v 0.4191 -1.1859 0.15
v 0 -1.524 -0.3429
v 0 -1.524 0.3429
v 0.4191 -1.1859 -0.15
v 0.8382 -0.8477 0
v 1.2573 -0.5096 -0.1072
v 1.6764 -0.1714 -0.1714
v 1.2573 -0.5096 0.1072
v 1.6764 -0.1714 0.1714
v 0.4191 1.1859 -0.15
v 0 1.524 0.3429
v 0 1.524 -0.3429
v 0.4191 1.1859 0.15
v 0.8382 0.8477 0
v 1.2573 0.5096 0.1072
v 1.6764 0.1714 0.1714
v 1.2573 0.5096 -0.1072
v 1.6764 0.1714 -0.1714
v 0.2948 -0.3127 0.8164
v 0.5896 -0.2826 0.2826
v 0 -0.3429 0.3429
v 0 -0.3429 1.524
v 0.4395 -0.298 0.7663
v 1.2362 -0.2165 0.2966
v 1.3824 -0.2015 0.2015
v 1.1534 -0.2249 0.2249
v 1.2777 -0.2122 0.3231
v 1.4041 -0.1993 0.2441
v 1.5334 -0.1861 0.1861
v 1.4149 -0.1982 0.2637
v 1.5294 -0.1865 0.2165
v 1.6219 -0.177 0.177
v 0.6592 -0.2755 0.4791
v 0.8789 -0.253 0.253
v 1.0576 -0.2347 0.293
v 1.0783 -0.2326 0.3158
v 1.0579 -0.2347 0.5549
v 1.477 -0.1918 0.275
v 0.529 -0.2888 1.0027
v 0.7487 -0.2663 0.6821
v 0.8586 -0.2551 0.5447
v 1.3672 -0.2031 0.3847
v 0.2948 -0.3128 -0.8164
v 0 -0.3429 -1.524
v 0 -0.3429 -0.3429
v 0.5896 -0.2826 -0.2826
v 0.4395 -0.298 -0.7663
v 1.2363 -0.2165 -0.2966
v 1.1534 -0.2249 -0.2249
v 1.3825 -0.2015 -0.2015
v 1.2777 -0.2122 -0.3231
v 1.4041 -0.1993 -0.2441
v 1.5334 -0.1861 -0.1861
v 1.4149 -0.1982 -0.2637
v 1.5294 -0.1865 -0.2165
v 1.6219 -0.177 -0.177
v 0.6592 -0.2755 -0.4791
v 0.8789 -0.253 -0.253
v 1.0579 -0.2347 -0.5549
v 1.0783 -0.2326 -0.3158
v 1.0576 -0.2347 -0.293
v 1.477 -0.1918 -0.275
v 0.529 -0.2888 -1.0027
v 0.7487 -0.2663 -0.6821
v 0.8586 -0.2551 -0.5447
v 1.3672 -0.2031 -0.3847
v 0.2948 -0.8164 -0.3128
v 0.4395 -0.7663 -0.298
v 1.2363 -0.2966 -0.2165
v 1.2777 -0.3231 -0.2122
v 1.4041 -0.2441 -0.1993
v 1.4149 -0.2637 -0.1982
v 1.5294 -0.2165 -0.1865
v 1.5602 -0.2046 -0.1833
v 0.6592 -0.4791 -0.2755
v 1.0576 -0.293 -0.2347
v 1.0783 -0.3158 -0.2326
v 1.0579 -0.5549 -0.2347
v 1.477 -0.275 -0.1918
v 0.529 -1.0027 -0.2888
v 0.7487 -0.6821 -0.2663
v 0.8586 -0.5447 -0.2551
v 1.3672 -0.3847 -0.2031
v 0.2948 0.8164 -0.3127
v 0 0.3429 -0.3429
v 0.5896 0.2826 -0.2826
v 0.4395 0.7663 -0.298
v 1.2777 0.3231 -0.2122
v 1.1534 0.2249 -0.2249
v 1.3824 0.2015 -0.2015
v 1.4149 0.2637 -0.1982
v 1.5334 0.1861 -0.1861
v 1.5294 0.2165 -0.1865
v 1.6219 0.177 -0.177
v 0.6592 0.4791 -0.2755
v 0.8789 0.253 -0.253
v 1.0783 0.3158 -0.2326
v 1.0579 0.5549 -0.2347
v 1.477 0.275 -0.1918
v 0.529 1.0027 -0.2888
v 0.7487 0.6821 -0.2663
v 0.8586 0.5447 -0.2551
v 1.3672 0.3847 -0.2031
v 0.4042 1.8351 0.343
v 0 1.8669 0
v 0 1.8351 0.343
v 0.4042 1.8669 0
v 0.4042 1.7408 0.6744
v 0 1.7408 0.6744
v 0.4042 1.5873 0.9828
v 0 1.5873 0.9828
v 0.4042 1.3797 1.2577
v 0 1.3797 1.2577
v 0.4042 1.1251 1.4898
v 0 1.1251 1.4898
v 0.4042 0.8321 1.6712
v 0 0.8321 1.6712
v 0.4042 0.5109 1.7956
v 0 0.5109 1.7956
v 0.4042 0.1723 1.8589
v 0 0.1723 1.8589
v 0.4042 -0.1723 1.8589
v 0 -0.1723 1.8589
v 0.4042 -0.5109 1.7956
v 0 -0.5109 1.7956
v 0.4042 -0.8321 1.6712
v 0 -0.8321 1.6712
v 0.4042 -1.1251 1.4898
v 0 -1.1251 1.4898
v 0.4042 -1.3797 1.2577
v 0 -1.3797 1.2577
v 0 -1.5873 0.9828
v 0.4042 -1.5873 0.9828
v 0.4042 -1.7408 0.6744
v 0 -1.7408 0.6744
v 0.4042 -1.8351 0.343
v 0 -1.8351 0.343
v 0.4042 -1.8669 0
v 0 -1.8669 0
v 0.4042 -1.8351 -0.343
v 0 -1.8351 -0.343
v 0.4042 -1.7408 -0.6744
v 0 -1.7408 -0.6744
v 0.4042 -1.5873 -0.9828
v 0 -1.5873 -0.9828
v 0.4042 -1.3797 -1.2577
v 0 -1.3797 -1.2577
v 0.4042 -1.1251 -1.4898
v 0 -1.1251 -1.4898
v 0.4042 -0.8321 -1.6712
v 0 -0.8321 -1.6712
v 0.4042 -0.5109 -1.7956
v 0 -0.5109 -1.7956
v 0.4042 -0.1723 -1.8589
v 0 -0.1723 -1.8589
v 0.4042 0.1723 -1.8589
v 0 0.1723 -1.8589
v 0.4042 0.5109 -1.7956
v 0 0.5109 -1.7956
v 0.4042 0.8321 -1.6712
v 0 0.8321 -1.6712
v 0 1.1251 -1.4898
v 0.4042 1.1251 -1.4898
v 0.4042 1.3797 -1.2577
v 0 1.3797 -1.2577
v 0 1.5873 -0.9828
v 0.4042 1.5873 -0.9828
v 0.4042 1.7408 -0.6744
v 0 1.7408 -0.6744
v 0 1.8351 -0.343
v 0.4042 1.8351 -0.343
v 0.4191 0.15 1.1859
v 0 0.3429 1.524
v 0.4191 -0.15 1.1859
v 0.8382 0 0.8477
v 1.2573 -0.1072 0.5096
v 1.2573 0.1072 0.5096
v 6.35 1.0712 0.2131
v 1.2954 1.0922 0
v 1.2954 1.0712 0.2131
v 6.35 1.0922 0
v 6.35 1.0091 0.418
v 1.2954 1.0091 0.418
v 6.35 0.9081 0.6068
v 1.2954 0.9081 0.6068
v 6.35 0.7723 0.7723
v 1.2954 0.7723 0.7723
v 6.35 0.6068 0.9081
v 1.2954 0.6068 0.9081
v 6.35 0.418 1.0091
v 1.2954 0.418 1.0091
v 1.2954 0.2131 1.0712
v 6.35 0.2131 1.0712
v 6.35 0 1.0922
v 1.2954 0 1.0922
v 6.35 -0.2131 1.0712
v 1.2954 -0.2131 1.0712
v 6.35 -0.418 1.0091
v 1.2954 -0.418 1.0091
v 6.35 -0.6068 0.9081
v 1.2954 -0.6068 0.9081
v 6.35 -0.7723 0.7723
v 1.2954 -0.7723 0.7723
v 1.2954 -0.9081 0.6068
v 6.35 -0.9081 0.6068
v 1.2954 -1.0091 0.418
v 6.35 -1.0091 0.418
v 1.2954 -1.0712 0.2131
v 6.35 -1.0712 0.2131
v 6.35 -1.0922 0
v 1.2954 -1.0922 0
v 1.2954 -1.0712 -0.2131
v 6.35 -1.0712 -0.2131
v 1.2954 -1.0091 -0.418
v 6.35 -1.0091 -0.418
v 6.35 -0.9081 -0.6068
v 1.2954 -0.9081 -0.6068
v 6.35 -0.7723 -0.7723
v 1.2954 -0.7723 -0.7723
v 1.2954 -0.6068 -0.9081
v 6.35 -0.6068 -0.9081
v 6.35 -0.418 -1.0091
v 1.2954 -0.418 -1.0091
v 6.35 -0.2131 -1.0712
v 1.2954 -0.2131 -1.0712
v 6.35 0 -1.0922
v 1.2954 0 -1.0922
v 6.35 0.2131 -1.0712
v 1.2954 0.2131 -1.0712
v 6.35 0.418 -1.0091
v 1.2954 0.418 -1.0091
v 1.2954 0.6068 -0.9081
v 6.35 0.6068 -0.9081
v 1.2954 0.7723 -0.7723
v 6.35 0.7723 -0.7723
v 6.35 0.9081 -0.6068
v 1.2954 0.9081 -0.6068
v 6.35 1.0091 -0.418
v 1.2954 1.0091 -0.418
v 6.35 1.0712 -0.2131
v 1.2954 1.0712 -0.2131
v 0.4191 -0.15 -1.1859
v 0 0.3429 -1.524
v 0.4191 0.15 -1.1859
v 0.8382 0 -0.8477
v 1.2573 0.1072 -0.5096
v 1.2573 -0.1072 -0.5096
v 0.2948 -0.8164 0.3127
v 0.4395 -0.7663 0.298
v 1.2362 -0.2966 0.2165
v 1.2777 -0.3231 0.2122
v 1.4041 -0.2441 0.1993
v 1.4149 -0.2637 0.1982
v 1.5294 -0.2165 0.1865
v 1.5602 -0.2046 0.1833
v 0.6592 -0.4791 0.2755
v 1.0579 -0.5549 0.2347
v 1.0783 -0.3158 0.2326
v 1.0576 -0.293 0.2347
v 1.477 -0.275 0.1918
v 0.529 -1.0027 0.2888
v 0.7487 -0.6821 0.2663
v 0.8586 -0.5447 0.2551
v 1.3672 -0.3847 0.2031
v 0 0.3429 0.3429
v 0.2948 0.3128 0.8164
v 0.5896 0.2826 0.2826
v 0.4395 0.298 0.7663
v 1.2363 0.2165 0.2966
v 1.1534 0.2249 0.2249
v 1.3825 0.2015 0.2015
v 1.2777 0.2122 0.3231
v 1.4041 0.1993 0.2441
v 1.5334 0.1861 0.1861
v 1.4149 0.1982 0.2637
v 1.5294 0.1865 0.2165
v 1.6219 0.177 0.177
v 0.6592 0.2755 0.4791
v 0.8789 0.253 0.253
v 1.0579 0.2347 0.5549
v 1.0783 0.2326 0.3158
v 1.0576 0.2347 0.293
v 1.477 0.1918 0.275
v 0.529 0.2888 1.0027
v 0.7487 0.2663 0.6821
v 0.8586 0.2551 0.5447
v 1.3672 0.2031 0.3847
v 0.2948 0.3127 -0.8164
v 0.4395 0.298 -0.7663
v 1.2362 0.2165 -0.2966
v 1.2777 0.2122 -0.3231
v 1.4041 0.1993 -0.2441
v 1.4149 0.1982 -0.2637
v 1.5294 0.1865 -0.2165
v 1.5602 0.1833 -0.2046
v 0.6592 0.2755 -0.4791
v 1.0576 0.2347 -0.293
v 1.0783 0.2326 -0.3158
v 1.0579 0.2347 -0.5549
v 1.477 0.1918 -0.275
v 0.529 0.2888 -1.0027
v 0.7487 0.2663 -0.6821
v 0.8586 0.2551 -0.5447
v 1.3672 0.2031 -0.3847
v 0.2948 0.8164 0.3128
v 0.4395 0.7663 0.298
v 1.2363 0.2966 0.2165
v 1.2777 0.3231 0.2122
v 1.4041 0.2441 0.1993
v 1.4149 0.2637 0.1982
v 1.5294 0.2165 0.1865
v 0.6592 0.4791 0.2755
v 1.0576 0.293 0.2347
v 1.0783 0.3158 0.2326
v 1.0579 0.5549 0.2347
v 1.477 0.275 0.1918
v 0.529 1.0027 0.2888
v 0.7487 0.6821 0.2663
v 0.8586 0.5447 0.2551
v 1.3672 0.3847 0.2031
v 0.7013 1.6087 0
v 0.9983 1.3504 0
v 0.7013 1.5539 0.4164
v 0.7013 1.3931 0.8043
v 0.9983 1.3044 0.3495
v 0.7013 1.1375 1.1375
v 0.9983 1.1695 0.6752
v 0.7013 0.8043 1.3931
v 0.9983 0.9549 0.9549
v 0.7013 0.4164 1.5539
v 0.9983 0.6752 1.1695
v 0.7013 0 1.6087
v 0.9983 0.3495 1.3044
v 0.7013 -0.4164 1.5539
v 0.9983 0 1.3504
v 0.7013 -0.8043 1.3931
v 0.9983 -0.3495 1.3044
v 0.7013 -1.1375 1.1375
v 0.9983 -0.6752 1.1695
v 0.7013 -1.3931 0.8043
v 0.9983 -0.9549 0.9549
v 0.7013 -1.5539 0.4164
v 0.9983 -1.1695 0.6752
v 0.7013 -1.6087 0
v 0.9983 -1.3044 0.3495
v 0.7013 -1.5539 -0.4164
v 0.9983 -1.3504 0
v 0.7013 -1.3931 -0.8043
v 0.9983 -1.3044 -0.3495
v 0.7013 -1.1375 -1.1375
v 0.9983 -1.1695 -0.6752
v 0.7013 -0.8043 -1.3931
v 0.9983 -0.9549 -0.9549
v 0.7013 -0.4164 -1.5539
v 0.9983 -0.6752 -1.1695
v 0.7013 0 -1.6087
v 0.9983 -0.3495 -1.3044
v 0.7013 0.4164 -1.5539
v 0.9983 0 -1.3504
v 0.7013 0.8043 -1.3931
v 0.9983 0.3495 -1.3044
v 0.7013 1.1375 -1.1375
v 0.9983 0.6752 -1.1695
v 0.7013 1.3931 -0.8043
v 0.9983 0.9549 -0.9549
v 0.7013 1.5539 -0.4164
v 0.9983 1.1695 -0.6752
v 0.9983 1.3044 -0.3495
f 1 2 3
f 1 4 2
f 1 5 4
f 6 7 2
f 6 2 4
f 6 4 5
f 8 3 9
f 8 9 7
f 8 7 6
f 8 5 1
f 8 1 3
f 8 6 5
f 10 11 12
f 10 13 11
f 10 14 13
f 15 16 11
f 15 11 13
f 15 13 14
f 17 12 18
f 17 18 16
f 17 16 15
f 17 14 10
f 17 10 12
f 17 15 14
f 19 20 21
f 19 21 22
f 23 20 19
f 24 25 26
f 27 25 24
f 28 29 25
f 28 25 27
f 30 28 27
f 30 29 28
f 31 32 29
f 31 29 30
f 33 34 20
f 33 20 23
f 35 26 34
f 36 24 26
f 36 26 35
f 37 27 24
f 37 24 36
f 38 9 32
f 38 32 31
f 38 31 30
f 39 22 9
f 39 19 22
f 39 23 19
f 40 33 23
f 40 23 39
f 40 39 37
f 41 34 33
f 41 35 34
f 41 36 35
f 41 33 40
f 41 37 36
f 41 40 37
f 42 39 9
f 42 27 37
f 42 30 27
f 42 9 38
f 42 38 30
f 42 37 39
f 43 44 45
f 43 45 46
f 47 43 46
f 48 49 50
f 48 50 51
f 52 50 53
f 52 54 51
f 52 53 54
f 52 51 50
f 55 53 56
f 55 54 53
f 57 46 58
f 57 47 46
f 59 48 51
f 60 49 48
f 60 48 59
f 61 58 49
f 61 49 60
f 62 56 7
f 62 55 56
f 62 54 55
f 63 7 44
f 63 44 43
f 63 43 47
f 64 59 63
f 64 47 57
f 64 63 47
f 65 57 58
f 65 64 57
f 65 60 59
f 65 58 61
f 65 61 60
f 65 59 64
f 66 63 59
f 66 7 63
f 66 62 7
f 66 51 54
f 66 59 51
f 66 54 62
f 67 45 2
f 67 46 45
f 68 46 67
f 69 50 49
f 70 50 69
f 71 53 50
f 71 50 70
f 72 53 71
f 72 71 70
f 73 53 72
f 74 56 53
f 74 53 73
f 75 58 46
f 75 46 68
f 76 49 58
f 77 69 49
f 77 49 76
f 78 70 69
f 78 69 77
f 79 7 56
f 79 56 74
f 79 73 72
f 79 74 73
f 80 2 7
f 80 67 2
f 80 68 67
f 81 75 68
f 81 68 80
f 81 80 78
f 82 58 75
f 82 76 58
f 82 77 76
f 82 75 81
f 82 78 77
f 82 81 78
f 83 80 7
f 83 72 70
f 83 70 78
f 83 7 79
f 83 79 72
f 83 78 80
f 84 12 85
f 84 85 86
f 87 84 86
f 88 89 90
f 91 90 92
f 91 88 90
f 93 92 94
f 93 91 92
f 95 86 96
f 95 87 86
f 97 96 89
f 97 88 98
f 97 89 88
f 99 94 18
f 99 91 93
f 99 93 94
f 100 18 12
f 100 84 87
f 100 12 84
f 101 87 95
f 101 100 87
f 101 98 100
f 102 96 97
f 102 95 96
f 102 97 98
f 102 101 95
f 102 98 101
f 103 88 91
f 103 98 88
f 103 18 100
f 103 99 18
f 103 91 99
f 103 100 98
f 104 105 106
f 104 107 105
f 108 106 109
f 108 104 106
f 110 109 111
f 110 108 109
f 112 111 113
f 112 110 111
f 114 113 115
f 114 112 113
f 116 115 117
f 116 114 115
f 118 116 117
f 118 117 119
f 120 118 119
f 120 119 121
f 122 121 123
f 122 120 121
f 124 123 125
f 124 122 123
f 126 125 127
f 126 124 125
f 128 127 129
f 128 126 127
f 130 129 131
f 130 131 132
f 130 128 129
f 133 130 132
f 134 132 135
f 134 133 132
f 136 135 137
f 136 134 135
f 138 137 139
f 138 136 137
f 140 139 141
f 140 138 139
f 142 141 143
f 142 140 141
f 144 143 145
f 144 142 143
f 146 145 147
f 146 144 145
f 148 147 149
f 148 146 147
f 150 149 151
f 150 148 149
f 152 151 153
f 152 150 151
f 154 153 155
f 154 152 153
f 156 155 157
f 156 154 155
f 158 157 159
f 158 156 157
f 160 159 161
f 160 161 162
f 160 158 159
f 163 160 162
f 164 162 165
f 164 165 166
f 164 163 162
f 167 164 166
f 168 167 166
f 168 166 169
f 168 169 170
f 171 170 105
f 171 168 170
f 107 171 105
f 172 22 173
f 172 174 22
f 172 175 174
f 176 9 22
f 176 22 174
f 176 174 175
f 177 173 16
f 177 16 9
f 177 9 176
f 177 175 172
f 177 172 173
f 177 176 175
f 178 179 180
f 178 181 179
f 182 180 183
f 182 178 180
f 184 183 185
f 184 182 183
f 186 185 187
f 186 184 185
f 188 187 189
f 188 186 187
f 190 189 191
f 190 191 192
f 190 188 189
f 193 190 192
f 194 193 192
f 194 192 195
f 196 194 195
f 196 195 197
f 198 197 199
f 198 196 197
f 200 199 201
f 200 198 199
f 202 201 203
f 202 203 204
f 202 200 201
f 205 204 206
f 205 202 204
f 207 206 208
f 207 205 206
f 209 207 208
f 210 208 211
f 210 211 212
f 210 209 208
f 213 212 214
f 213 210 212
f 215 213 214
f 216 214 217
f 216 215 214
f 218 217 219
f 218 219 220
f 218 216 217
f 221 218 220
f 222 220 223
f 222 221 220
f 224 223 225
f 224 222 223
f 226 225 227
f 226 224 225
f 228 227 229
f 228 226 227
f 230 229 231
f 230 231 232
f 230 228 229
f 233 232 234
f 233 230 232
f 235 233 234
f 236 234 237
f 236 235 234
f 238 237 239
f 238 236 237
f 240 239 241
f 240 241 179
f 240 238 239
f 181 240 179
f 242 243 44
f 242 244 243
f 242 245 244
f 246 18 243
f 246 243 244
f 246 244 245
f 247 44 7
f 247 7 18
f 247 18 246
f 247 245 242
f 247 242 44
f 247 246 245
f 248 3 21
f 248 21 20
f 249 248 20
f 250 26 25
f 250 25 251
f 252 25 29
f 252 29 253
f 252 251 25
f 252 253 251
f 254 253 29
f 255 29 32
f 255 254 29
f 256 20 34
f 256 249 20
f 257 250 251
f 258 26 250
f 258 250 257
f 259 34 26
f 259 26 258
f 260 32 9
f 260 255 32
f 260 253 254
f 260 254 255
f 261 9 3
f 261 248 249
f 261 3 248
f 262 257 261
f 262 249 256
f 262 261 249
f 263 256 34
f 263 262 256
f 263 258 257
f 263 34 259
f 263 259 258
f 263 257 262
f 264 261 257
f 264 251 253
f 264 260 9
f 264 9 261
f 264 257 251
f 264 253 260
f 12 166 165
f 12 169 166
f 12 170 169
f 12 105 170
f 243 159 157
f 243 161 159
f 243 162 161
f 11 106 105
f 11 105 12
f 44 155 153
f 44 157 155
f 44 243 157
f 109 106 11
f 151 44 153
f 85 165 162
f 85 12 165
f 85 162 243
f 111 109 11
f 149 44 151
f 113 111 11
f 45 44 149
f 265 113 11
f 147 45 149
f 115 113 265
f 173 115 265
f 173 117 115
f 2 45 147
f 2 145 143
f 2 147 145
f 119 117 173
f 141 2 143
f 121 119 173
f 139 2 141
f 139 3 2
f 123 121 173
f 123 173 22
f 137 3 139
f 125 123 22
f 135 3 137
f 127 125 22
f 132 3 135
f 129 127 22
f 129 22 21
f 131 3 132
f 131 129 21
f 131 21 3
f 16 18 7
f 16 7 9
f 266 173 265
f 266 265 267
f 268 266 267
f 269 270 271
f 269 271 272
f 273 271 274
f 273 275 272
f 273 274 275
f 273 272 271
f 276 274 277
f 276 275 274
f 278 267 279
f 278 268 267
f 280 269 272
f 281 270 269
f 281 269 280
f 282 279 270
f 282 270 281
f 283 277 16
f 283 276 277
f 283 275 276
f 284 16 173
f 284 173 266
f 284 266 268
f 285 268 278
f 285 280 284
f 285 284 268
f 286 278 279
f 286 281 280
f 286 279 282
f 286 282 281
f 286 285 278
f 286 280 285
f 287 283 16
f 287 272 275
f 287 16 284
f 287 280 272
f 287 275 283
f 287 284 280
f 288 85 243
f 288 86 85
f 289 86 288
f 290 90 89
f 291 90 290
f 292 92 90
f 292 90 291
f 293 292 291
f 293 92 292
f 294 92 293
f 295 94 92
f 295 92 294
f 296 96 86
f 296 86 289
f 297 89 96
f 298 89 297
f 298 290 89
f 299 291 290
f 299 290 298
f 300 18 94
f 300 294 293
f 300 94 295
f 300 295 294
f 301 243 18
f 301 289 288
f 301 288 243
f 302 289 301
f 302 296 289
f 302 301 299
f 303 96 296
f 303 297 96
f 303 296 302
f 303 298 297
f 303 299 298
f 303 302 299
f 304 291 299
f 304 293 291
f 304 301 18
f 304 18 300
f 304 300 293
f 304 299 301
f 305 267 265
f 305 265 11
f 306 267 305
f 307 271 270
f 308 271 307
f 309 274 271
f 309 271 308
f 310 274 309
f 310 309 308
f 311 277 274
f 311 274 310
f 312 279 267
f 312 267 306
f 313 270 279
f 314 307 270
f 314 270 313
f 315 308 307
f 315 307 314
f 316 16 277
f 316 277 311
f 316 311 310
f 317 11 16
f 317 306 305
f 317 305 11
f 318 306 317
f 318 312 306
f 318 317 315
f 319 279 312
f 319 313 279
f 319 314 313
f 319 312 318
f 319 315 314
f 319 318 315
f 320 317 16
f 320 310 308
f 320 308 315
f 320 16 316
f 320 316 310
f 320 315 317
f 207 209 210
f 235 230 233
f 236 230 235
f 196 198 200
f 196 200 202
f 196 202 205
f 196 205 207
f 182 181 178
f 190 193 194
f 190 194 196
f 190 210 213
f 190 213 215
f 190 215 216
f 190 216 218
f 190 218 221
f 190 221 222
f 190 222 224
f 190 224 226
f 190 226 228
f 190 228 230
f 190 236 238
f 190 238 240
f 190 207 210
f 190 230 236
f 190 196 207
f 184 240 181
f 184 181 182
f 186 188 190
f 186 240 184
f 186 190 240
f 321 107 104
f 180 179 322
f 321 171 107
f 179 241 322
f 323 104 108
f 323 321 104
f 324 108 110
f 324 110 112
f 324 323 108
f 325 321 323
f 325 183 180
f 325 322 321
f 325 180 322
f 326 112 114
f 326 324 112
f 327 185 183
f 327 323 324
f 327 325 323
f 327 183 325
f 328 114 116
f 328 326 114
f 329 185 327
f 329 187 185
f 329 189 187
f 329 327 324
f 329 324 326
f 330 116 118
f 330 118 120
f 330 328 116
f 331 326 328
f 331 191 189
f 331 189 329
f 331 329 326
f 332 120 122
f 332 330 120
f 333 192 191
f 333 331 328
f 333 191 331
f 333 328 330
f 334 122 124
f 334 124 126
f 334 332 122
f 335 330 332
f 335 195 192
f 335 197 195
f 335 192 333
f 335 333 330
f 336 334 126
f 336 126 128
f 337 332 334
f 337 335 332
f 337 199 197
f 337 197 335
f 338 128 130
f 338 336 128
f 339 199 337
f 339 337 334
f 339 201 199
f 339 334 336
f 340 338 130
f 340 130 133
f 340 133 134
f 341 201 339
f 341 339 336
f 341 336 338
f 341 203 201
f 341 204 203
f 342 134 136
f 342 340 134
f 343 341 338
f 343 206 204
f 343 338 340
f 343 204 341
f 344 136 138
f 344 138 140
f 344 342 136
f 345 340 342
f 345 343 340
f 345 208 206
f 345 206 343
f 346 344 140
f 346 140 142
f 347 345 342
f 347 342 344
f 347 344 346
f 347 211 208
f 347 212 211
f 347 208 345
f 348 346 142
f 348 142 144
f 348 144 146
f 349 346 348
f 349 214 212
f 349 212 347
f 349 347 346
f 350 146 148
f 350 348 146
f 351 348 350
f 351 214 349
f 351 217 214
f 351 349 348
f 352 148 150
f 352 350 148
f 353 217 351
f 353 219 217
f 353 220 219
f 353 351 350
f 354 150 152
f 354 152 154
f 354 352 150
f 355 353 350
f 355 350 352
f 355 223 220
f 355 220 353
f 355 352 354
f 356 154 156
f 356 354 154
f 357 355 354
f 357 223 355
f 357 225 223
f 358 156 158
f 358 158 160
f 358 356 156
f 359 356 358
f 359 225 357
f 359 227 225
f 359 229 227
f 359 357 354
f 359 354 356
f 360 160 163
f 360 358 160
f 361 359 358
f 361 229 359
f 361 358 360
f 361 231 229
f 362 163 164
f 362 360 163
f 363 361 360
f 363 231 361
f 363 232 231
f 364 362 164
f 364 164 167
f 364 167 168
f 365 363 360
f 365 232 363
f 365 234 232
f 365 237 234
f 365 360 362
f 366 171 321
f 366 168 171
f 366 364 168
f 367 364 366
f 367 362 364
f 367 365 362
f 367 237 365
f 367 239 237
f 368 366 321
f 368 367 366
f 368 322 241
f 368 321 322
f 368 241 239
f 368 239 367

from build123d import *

# Parameters (mm, degrees)
SKETCH3_W         = 0.6858
SKETCH3_H         = 3.048
SKETCH4_W         = 0.3429
SKETCH4_H         = 0.3429
CIRPATTERN1_COUNT = 2
CIRPATTERN1_ANGLE = 90


with BuildPart() as part:
    # BodySke → Base-Revolve (revolve)
    with BuildSketch(Plane.XY):
        Polygon((0, 0), (0, 1.8669), (0.404209595, 1.8669), (1.2954, 1.0922), (6.35, 1.0922), (6.35, 0), align=None)
    revolve(axis=Axis((-6.35, 0, 0), (1, 0, 0)))

    # Sketch3 → Cross section 0
    with BuildSketch(Plane.ZY):
        Rectangle(SKETCH3_W, SKETCH3_H)
    # Sketch4 → Cross section 1
    with BuildSketch(Plane.ZY.offset(-1.6764)):
        Rectangle(SKETCH4_W, SKETCH4_H)
    cross = loft(mode=Mode.SUBTRACT)

    # CirPattern1: Cross ×2 about axis
    cirpattern1_axis = Axis((0, 0, 0), (1, 0, 0))
    for i in range(1, CIRPATTERN1_COUNT):
        add(cross.rotate(cirpattern1_axis, i * CIRPATTERN1_ANGLE / (CIRPATTERN1_COUNT - 1)), mode=Mode.SUBTRACT)


solid = part.part
